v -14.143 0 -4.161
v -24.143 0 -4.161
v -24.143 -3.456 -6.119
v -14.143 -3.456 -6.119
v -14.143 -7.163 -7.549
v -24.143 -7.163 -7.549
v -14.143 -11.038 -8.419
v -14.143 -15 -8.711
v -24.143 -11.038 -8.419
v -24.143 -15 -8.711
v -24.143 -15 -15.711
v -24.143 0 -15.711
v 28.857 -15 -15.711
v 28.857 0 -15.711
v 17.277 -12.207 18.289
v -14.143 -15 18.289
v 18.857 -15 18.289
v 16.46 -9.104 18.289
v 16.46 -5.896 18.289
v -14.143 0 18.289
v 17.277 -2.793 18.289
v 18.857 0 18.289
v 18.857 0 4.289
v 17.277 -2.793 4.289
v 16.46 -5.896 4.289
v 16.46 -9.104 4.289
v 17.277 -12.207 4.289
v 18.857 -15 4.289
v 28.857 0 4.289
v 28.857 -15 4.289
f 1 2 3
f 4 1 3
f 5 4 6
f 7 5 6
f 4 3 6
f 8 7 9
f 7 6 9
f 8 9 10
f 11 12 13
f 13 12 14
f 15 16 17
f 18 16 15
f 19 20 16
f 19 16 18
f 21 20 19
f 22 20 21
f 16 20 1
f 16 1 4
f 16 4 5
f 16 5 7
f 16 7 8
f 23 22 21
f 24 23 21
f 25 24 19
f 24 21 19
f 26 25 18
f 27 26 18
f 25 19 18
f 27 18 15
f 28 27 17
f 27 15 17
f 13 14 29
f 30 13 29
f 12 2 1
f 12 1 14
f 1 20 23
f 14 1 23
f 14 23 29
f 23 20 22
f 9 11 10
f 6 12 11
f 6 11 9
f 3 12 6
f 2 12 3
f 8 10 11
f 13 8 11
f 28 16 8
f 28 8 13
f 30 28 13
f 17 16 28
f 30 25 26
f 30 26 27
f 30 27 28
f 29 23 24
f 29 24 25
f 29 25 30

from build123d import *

# Parameters (mm, degrees)
F0_W     = 53
F0_H     = 34
F1_DEPTH = 15
F2_R     = 27
F3_DEPTH = 10
F5_DEPTH = 14


with BuildPart() as f1:
    # F0 (on Front) → F1 (new body)
    with BuildSketch(Plane.XZ):
        with Locations((2.3567589563, 1.288594678)):
            Rectangle(F0_W, F0_H)
    extrude(amount=F1_DEPTH)

    # F2 (on face) → F3 (cut)
    with BuildSketch(Plane(origin=(-24.1432410437, 0, 0), x_dir=(0, -1, 0), z_dir=(-1, 0, 0))):
        with Locations((15, 18.288594678)):
            Circle(F2_R)
    extrude(amount=-F3_DEPTH, mode=Mode.SUBTRACT)

    # F4 (on face) → F5 (cut)
    with BuildSketch(Plane.XY.offset(18.288594678)):
        with BuildLine():
            Line((28.8567589563, 0), (18.8567589563, 0))
            ThreePointArc((18.8567589563, 0), (16.3567589563, -7.5), (18.8567589563, -15))
            Line((18.8567589563, -15), (28.8567589563, -15))
            Line((28.8567589563, -15), (28.8567589563, 0))
        make_face()
    extrude(amount=-F5_DEPTH, mode=Mode.SUBTRACT)


solid = f1.part
